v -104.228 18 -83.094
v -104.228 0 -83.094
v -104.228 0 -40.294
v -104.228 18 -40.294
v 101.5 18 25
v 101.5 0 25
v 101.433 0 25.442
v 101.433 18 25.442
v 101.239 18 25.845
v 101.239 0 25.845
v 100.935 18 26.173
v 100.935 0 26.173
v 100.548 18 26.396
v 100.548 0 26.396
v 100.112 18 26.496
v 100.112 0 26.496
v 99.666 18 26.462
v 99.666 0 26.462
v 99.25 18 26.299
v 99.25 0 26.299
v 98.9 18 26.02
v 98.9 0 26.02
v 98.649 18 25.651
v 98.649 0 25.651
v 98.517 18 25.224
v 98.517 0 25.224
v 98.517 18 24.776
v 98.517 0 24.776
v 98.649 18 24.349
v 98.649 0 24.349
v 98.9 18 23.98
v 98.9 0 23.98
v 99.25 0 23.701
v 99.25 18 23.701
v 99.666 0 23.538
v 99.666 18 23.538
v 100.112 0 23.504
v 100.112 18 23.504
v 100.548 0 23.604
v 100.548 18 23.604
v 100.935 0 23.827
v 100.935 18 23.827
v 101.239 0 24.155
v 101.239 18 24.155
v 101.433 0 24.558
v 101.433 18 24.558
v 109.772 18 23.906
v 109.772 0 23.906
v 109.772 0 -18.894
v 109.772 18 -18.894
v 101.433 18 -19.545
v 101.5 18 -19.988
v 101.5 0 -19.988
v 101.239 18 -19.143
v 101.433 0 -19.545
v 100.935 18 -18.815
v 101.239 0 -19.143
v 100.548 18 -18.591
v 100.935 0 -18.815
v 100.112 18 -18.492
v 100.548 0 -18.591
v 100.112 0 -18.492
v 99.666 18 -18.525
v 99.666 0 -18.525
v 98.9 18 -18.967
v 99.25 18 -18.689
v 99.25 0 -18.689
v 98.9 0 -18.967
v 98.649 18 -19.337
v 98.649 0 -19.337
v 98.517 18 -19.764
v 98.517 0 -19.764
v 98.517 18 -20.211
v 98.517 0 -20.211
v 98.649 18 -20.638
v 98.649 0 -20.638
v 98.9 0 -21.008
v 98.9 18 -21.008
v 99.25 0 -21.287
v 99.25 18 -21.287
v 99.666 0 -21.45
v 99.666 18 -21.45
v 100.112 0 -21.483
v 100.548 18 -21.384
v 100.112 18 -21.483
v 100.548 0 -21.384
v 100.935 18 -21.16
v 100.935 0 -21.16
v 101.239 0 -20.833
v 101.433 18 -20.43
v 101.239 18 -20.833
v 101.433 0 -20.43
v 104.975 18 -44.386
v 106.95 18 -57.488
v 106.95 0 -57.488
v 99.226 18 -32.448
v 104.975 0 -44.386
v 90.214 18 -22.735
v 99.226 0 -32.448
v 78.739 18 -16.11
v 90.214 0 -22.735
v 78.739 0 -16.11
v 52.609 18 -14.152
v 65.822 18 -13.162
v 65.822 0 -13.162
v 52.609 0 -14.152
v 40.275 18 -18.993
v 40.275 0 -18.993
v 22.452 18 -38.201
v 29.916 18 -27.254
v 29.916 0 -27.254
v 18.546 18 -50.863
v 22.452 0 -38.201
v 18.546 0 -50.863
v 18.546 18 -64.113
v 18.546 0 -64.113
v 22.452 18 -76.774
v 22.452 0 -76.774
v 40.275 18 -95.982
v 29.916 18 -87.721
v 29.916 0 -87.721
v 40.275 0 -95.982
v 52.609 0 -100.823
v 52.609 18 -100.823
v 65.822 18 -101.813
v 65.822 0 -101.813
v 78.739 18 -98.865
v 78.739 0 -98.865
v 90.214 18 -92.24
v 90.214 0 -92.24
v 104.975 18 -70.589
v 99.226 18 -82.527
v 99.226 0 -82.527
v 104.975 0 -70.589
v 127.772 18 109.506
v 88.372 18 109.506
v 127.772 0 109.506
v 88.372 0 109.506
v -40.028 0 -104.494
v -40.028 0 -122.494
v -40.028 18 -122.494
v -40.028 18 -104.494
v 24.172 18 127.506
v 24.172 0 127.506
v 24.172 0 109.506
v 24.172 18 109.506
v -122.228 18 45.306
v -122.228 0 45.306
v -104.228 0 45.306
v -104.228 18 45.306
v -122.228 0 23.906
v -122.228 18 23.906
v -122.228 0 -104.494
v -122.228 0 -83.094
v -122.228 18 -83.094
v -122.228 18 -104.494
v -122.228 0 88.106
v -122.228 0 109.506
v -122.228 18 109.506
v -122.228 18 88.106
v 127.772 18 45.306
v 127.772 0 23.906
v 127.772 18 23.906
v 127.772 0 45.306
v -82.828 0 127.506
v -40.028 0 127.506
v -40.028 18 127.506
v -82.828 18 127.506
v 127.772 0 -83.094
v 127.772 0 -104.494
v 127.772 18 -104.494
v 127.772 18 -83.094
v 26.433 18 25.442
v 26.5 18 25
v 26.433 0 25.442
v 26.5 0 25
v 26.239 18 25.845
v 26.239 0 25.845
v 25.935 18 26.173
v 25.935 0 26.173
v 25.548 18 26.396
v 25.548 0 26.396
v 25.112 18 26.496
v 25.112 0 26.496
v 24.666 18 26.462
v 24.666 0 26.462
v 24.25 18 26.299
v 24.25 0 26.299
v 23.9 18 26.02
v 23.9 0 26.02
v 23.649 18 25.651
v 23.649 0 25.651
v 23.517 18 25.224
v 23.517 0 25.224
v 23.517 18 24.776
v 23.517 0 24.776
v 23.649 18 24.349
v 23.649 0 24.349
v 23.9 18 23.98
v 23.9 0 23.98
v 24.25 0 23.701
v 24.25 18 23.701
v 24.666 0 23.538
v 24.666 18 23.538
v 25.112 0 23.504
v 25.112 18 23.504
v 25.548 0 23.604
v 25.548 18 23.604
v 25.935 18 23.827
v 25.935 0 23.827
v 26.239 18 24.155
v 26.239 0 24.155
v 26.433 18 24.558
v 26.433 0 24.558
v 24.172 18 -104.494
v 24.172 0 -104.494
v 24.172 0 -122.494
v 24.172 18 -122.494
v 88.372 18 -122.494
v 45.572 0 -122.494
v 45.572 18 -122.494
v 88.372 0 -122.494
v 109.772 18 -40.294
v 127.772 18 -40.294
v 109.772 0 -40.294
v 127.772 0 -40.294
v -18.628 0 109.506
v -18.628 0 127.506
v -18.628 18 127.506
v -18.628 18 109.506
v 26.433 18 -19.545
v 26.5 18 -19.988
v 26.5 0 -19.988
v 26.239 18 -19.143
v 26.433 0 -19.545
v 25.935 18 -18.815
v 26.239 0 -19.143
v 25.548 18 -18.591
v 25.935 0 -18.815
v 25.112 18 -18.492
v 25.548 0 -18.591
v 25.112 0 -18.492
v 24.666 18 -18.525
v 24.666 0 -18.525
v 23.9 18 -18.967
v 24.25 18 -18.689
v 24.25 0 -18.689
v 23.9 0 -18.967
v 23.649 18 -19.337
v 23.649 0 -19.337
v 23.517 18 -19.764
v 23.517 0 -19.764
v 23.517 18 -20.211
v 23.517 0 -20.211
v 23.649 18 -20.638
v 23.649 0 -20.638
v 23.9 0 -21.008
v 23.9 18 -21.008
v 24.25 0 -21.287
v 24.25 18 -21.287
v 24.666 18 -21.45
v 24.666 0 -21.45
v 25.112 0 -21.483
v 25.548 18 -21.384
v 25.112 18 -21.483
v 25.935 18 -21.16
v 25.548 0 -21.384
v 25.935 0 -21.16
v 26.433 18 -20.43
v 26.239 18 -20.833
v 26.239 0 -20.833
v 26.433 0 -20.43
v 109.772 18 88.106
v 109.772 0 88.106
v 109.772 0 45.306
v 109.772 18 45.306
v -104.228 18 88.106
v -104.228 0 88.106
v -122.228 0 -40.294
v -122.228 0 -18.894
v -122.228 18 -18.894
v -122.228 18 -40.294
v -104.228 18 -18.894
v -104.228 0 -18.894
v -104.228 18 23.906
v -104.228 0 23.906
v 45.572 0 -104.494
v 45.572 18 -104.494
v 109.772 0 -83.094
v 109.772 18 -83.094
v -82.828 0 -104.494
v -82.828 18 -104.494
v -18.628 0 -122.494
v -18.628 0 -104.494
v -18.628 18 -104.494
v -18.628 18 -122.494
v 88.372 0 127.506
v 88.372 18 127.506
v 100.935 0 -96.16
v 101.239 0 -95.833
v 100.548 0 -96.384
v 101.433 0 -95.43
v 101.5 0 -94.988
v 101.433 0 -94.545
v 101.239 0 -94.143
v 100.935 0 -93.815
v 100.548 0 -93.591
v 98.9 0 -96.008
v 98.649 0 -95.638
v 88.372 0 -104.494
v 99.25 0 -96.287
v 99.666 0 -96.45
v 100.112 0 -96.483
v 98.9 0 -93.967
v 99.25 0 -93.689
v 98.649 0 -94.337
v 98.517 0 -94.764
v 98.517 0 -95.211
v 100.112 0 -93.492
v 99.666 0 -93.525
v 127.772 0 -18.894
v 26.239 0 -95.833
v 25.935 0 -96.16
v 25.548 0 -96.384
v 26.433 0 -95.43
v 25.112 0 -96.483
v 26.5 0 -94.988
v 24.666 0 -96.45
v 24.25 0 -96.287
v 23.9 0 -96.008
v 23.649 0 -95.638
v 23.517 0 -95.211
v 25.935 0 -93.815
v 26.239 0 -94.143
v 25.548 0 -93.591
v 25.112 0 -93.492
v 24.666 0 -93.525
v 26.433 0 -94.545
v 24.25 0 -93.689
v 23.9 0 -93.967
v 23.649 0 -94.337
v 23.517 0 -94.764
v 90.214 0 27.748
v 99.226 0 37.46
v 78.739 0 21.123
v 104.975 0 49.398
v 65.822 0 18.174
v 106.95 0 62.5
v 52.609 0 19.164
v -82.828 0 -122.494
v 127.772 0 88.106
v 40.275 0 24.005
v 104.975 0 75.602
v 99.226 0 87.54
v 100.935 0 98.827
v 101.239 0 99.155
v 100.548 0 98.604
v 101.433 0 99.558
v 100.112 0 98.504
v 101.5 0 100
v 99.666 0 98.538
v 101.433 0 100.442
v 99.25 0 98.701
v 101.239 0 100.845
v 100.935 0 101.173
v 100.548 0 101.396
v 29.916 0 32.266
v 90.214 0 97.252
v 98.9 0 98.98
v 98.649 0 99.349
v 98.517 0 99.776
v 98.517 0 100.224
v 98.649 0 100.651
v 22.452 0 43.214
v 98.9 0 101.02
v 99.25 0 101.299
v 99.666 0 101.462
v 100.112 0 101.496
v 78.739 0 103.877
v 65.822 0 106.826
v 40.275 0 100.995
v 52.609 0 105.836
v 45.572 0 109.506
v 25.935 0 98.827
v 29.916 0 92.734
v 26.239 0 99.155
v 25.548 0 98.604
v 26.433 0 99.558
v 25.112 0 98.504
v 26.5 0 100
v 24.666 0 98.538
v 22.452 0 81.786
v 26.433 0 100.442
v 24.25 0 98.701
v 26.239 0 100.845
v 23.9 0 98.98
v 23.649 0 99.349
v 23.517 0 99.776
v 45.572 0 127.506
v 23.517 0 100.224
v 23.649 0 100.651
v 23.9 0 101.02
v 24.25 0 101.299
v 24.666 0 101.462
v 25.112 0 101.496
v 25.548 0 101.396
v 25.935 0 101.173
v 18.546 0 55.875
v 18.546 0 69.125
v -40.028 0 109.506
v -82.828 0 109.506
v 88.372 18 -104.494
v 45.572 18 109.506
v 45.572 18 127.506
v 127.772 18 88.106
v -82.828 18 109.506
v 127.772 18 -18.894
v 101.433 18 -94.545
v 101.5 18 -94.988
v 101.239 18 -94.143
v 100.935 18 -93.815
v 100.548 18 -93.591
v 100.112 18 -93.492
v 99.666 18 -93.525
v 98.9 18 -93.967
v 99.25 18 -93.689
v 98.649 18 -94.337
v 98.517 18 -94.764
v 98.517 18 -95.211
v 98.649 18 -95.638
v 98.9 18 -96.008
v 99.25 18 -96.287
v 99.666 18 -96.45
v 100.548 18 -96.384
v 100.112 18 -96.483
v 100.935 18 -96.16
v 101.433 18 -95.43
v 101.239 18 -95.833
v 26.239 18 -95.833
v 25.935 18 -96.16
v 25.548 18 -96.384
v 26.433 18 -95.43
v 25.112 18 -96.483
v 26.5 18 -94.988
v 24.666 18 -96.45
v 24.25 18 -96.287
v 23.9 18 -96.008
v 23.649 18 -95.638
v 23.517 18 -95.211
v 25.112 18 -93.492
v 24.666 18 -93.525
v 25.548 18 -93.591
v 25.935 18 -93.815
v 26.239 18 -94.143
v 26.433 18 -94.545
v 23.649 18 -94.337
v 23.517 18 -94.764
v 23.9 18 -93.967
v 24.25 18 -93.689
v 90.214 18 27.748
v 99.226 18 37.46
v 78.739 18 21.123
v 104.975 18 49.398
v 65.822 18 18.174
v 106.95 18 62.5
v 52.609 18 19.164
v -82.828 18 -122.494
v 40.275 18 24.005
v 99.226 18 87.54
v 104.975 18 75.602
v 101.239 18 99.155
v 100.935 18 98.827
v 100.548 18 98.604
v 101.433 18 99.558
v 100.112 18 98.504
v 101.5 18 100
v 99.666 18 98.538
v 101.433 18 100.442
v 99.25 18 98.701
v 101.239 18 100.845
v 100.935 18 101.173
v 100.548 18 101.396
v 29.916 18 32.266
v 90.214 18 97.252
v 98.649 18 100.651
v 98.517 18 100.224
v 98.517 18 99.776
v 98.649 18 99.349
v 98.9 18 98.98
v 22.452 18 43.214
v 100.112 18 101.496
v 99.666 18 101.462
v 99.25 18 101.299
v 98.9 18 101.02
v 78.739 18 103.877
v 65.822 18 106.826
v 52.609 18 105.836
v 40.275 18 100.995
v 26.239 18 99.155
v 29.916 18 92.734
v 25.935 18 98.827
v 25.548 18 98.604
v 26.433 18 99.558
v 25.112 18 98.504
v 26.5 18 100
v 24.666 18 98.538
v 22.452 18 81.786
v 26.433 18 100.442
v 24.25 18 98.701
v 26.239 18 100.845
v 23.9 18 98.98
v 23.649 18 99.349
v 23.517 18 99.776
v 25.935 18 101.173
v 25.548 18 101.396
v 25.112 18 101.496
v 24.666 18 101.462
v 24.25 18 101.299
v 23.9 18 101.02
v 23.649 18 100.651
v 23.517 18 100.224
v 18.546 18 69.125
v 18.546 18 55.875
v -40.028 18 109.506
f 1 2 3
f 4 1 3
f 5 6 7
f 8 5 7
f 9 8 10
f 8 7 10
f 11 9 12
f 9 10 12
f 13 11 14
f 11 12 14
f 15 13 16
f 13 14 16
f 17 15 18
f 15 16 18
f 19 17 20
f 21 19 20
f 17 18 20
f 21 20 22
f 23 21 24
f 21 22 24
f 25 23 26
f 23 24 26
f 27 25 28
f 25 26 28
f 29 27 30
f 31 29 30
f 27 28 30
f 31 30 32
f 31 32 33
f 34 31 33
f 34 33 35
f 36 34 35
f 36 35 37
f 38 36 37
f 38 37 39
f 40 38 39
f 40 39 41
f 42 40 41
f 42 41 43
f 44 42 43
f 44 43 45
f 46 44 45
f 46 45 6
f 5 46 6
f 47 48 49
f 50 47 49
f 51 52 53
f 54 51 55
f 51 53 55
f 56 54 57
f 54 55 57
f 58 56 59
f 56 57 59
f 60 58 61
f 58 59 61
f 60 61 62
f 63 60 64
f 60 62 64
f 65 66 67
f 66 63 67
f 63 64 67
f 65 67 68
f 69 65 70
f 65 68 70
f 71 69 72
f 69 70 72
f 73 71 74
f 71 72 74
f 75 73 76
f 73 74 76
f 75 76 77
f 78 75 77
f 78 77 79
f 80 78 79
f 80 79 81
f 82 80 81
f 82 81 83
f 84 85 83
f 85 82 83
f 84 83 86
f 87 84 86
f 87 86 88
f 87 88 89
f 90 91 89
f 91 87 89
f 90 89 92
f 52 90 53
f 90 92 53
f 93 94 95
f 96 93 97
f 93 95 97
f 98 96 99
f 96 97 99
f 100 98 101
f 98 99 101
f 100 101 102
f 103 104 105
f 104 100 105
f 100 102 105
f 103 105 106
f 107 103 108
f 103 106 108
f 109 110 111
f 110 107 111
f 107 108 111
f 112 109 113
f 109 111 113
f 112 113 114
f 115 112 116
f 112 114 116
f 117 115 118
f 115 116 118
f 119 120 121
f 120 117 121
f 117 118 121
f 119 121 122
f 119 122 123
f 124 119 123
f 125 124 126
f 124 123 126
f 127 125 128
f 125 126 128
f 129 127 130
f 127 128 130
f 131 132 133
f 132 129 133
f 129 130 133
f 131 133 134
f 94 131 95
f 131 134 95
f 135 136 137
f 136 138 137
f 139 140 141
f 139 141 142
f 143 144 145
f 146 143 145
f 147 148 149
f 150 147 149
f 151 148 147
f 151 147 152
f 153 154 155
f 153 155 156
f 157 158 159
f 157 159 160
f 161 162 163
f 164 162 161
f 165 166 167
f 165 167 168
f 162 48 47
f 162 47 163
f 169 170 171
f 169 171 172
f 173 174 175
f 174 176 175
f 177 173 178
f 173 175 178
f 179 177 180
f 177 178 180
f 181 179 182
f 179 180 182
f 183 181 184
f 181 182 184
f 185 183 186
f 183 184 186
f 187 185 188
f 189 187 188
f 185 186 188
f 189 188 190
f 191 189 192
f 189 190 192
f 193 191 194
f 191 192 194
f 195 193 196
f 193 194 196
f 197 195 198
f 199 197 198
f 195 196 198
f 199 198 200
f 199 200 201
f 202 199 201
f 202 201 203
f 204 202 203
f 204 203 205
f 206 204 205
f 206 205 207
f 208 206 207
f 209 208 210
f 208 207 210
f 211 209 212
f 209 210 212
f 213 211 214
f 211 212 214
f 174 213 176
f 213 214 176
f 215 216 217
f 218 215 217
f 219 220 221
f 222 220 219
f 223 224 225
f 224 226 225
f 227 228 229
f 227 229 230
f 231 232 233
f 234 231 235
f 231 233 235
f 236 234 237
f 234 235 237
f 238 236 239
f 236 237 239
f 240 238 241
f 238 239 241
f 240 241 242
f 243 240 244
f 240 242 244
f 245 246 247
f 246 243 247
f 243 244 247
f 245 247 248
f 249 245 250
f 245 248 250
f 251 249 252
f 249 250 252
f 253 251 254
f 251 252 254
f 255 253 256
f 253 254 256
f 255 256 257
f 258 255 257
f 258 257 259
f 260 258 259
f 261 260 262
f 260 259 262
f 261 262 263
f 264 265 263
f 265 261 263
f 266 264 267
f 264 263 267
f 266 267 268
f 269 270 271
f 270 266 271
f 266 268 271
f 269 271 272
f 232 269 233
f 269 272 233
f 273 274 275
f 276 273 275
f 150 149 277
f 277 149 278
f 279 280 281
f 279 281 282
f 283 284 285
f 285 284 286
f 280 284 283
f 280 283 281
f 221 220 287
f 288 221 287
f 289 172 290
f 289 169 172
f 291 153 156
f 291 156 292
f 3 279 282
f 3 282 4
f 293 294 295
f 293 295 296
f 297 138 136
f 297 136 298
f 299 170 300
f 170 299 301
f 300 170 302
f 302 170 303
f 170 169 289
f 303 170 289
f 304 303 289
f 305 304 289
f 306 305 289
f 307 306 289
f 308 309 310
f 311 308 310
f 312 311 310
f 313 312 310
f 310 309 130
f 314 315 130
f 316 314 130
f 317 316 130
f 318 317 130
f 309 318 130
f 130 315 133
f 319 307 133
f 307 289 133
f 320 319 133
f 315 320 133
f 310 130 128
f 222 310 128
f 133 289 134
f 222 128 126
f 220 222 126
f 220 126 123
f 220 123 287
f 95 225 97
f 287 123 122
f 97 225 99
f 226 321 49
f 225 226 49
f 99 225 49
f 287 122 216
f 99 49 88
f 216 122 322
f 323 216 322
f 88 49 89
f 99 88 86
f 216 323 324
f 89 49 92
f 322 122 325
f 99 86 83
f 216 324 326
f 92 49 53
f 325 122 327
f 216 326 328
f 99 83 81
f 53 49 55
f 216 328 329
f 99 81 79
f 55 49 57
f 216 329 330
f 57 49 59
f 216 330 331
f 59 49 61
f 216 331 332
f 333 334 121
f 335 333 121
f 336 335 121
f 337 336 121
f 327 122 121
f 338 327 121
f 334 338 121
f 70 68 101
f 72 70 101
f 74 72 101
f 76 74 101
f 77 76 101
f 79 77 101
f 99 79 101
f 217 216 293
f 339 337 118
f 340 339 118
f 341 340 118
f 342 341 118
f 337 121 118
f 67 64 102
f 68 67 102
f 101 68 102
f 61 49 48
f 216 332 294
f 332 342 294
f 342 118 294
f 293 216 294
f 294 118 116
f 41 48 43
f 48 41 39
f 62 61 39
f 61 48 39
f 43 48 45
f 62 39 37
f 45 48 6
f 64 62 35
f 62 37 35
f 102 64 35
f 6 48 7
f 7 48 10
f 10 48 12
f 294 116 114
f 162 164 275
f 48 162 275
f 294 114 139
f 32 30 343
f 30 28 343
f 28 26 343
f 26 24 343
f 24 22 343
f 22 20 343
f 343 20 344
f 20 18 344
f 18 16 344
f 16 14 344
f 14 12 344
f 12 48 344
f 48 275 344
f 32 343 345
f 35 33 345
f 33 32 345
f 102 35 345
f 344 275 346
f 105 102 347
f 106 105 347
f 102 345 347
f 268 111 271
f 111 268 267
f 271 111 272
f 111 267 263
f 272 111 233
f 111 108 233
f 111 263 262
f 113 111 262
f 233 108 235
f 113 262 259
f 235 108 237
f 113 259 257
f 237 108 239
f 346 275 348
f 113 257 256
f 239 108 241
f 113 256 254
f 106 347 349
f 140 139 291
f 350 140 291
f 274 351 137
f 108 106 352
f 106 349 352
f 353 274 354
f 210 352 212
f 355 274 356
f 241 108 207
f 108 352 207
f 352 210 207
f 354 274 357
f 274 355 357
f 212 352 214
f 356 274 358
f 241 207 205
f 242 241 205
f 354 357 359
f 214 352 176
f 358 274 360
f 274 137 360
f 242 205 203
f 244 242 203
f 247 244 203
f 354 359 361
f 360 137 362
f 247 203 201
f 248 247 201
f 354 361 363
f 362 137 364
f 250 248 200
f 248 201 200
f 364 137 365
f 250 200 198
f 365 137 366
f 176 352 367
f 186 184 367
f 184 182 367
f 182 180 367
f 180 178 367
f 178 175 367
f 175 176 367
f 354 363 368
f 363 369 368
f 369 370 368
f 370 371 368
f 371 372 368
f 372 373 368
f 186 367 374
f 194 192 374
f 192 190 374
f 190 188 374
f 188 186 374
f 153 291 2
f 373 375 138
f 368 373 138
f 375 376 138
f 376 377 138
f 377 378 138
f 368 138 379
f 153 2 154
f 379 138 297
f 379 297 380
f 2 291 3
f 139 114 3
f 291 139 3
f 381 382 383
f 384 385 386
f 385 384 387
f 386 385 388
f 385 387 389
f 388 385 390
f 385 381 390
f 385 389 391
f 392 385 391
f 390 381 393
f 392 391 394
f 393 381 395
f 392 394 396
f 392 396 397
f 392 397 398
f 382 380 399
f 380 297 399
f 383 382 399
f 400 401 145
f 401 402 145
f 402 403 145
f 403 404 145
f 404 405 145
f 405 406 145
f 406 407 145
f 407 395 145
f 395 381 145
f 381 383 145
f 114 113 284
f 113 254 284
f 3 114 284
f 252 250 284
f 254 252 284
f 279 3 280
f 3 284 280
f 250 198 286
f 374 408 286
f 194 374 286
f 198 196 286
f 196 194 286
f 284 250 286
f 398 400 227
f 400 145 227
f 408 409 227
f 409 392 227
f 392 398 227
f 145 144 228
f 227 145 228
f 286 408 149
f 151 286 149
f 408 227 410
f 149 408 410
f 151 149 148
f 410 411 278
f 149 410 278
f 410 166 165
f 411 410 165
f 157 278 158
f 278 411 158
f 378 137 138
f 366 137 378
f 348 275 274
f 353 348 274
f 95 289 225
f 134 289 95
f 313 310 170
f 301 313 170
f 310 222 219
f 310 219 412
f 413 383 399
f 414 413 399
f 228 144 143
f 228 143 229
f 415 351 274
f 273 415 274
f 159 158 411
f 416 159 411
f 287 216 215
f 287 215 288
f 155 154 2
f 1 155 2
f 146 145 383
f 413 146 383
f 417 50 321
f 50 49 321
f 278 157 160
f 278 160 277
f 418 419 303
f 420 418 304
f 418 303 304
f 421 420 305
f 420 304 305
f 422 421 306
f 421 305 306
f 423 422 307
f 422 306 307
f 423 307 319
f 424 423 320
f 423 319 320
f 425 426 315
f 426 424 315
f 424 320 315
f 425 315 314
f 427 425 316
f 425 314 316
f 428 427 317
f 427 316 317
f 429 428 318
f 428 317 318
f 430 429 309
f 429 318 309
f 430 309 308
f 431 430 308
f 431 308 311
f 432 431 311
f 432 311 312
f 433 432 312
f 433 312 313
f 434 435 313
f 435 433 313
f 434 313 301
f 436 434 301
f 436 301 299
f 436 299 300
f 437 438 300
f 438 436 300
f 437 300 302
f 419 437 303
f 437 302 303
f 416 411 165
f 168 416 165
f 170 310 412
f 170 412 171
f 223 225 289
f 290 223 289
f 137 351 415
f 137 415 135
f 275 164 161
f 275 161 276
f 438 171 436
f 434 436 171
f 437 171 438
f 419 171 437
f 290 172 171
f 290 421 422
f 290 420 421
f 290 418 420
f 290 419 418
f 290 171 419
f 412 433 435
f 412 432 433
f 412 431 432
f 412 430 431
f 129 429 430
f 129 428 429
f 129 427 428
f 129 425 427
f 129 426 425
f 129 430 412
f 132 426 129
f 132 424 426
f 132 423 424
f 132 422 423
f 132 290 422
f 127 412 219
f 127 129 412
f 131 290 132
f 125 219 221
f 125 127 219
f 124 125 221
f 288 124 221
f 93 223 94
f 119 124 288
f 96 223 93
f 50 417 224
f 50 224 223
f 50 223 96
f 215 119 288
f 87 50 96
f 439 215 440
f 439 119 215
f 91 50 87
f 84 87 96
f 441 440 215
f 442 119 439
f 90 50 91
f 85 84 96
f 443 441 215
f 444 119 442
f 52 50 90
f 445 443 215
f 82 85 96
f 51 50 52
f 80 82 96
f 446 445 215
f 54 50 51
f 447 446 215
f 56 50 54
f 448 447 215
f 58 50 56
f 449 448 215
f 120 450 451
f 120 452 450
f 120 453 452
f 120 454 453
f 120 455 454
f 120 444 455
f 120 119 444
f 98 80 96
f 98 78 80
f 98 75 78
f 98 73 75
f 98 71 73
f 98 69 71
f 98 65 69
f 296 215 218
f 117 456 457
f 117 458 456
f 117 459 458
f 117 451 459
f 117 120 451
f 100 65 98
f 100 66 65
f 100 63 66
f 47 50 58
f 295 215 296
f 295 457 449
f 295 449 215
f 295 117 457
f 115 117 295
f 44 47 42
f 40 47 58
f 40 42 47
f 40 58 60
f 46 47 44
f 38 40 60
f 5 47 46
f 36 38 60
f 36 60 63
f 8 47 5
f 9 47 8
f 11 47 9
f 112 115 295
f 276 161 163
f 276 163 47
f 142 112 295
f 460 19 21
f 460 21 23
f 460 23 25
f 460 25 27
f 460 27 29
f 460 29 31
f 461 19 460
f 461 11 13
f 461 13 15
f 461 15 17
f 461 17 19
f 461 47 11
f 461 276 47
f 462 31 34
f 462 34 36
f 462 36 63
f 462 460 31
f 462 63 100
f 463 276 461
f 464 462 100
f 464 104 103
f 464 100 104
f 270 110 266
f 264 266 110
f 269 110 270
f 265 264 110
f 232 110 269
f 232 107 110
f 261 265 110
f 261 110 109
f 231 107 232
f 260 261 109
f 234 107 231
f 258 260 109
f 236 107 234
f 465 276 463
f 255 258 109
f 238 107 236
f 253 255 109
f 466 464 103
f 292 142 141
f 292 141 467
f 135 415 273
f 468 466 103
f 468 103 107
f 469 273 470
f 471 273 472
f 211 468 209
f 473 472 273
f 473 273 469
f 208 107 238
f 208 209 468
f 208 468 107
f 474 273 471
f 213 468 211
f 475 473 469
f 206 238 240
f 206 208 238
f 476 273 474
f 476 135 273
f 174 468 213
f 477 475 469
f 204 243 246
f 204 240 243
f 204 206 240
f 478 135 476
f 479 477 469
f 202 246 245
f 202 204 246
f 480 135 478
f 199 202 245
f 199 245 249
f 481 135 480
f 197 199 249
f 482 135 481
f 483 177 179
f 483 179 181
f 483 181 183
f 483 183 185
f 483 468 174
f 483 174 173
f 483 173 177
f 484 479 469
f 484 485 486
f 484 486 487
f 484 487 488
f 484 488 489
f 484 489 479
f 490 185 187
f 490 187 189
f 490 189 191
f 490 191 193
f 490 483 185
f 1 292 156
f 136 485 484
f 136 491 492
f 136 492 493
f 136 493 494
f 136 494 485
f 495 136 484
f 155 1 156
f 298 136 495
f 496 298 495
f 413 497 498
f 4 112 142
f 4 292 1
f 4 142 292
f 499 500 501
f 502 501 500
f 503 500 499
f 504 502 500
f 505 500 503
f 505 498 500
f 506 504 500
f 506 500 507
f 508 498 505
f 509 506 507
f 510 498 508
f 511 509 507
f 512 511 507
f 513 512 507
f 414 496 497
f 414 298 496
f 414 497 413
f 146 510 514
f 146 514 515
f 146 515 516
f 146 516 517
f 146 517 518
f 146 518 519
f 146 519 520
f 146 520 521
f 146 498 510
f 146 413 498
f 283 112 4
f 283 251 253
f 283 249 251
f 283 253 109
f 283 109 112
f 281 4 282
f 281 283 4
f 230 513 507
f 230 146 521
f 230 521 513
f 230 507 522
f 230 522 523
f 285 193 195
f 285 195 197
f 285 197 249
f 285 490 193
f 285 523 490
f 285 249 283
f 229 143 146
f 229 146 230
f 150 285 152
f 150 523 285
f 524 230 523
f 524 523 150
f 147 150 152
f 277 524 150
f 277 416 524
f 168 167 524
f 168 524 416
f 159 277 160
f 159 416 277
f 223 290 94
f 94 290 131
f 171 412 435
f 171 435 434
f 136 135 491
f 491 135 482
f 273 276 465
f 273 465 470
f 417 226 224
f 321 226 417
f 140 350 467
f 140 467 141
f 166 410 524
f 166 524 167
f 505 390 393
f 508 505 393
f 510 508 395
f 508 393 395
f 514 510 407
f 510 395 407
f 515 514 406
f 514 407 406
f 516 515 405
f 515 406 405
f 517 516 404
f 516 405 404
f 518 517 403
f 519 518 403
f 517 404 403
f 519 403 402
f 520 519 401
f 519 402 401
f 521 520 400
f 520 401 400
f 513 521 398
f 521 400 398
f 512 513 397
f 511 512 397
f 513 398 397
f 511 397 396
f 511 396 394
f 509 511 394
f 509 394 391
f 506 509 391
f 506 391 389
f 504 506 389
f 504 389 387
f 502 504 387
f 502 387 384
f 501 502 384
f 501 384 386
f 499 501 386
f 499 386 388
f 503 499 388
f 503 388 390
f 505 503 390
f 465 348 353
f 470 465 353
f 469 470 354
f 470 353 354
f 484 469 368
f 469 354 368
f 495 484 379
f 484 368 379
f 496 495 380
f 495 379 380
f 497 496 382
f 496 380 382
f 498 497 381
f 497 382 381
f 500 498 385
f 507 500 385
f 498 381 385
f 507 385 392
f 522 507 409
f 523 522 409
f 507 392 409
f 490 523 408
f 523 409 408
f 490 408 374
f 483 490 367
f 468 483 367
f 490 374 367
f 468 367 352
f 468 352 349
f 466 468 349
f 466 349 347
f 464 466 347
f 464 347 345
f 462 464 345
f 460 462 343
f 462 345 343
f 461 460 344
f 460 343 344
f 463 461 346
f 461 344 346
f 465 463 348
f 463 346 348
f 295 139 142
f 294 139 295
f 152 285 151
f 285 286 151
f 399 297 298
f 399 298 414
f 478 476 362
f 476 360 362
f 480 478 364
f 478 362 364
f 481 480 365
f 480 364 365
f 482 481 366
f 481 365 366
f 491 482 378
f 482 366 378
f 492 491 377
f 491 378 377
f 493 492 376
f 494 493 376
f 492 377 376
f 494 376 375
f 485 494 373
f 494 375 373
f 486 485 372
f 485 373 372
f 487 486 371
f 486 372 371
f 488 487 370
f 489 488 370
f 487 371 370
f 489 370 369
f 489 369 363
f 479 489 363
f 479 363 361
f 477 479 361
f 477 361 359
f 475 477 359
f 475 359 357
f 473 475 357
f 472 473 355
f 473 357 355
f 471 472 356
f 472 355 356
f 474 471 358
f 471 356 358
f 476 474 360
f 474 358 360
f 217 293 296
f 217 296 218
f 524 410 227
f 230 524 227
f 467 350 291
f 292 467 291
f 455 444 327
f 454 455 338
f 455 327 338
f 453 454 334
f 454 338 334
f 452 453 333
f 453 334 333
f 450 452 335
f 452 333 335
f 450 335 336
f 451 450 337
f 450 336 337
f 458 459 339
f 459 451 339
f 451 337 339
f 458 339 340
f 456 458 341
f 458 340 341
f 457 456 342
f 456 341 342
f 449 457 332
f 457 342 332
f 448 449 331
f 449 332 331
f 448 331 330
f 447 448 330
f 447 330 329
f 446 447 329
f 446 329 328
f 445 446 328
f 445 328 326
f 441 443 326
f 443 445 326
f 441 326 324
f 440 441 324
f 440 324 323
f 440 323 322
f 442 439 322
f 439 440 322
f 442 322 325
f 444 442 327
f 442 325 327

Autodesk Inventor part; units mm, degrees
ref_plane "YZ Plane" through (0, 0, 0) normal (1, 0, 0) x (0, 1, 0)
ref_plane "XZ Plane" through (0, 0, 0) normal (0, 1, 0) x (-1, 0, 0)
ref_plane "XY Plane" through (0, 0, 0) normal (0, 0, 1) x (1, 0, 0)
sketch "Sketch1" plane through (0, 0, 0) normal (0, 1, 0) x (-1, 0, 0)
  line L0 (-127.7724, 127.5062) -> (122.2276, 127.5062)
  line L1 (122.2276, 127.5062) -> (122.2276, -122.4938)
  line L2 (122.2276, -122.4938) -> (-127.7724, -122.4938)
  line L3 (-127.7724, -122.4938) -> (-127.7724, 127.5062)
  line L4 (104.2276, -104.4938) -> (104.2276, 109.5062)
  line L5 (104.2276, -104.4938) -> (-109.7724, -104.4938)
  line L6 (-109.7724, -104.4938) -> (104.2276, -104.4938)
  line L7 (122.2276, 109.5062) -> (122.2276, 88.1062)
  line L8 (122.2276, 88.1062) -> (104.2276, 88.1062)
  line L9 (104.2276, 88.1062) -> (104.2276, 109.5062)
  line L10 (122.2276, 45.3062) -> (104.2276, 45.3062)
  line L11 (104.2276, 45.3062) -> (104.2276, 23.9062)
  line L12 (104.2276, 23.9062) -> (122.2276, 23.9062)
  line L13 (104.2276, -18.8938) -> (122.2276, -18.8938)
  line L14 (122.2276, -40.2938) -> (104.2276, -40.2938)
  line L15 (122.2276, -83.0938) -> (104.2276, -83.0938)
  line L16 (-127.7724, 127.5062) -> (-127.7724, 109.5062)
  line L17 (104.2276, 109.5062) -> (104.2276, 127.5062)
  line L18 (-127.7724, -83.0938) -> (-109.7724, -83.0938)
  line L19 (-127.7724, -40.2938) -> (-109.7724, -40.2938)
  line L20 (-109.7724, -18.8938) -> (-127.7724, -18.8938)
  line L21 (-109.7724, 23.9062) -> (-127.7724, 23.9062)
  line L22 (-127.7724, 45.3062) -> (-109.7724, 45.3062)
  line L23 (-127.7724, 88.1062) -> (-109.7724, 88.1062)
  line L24 (18.6276, -104.4938) -> (18.6276, -122.4938)
  line L25 (-24.1724, -104.4938) -> (-24.1724, -122.4938)
  line L26 (-45.5724, -122.4938) -> (-45.5724, -104.4938)
  line L27 (-88.3724, -122.4938) -> (-88.3724, -104.4938)
  line L28 (40.0276, -122.4938) -> (40.0276, -104.4938)
  line L29 (82.8276, -122.4938) -> (82.8276, -104.4938)
  line L30 (18.6276, 127.5062) -> (18.6276, 109.5062)
  line L31 (40.0276, 109.5062) -> (40.0276, 127.5062)
  line L32 (82.8276, 109.5062) -> (82.8276, 127.5062)
  line L33 (-45.5724, 109.5062) -> (-45.5724, 127.5062)
  line L34 (-88.3724, 109.5062) -> (-88.3724, 127.5062)
  line L35 (-24.1724, 127.5062) -> (-24.1724, 109.5062)
  line L36 (104.2276, 109.5062) -> (-109.7724, 109.5062)
  line L37 (-109.7724, 109.5062) -> (-109.7724, -104.4938)
  line L38 (-109.7724, 109.5062) -> (-127.7724, 109.5062)
  line L39 (-127.7724, 109.5062) -> (-127.7724, 127.5062)
  line L40 (-127.7724, 127.5062) -> (-109.7724, 127.5062)
  line L41 (-109.7724, 127.5062) -> (-109.7724, 109.5062)
  line L42 (-109.7724, -104.4938) -> (-127.7724, -104.4938)
  line L43 (-127.7724, -104.4938) -> (-127.7724, -122.4938)
  line L44 (-127.7724, -122.4938) -> (-109.7724, -122.4938)
  line L45 (-109.7724, -122.4938) -> (-109.7724, -104.4938)
  line L46 (104.2276, -104.4938) -> (122.2276, -104.4938)
  line L47 (122.2276, -104.4938) -> (122.2276, -122.4938)
  line L48 (122.2276, -122.4938) -> (104.2276, -122.4938)
  line L49 (104.2276, -122.4938) -> (104.2276, -104.4938)
  line L50 (104.2276, 109.5062) -> (122.2276, 109.5062)
  line L51 (122.2276, 109.5062) -> (122.2276, 127.5062)
  line L52 (122.2276, 127.5062) -> (104.2276, 127.5062)
  line L53 (104.2276, 127.5062) -> (104.2276, 109.5062)
  point P0 (0, 0)
  point P1 (-127.7724, -18.8938)
  point P2 (-109.7724, -104.4938)
  point P3 (-109.7724, -104.4938)
  dimension "d0" = 250
  dimension "d1" = 250
  dimension "d2" = 21.4
extrude "Plate1" add sketch "Sketch1" along normal blind 18 contours L38 L37 L23 L3 | L0 L33 L36 L34 | L36 L4 L5 L37 | L22 L37 L21 L3 | L0 L30 L36 L35 | L20 L37 L19 L3 | L0 L32 L36 L31 | L18 L37 L42 L3 | L50 L1 L8 L4 | L5 L26 L2 L27 | L10 L1 L12 L4 | L5 L24 L2 L25 | L13 L1 L14 L4 | L5 L29 L2 L28 | L15 L1 L46 L4
sketch "Sketch2" plane through (0, 0, 0) normal (0, -1, 0) x (1, 0, 0)
  line L0 (0, 0) -> (125, 0)
  line L1 (125, 0) -> (125, 125)
  line L2 (125, 125) -> (0, 125)
  line L3 (0, 125) -> (0, 0)
  line L4 (125, 125) -> (62.5, 125)
  line L5 (125, 62.5) -> (125, 125)
  circle A0 centre (62.5, 62.5) radius 44.45
  line L6 (25, 100) -> (100, 100)
  line L7 (100, 100) -> (100, 25)
  line L8 (100, 25) -> (25, 25)
  line L9 (25, 25) -> (25, 100)
  line L10 (25, 100) -> (100, 25) construction
  line L11 (100, 100) -> (25, 25) construction
  circle A1 centre (100, 100) radius 1.5
  circle A2 centre (100, 25) radius 1.5
  circle A3 centre (25, 25) radius 1.5
  circle A4 centre (25, 100) radius 1.5
  dimension "d4" = 125
  dimension "d5" = 125
  dimension "d6" = 88.9
  dimension "d7" = 75
  dimension "d8" = 75
  dimension "d9" = 3
  dimension "d10" = 3
  dimension "d11" = 3
  dimension "d12" = 3
extrude "Cut1" cut sketch "Sketch2" against normal blind 18 contours A0 L7 | L7 A0 L8 L9 L6 | L6 A0 | A1 L6 L7 | L7 L6 A1 | A0 L8 | A2 L8 L7 | L7 L8 A2 | L9 A0 | A4 L9 L6 | L6 L9 A4 | A3 L9 L8 | L8 L9 A3
ref_plane "Work Plane1" through (45.5724, 0, 2.5062) normal (0, 0, 1) x (1, 0, 0)
mirror "Mirror1" about plane through (45.5724, 0, 2.5062) normal (0, 0, 1) of "Cut1"
equation "\"d13\" = Thickness"
equation "\"d3\" = Thickness"
equation "\"BendRadius\" = Thickness"
equation "\"BendReliefWidth\" = Thickness"
equation "\"BendReliefDepth\" = 0.5 * Thickness"
equation "\"CornerReliefSize\" = 4 * Thickness"
equation "\"MinimumRemnant\" = 2 * Thickness"
equation "\"TransitionRadius\" = BendRadius"
equation "\"JacobiRadiusSize\" = BendRadius"
equation "\"GapSize\" = Thickness"
equation "\"Thickness\" = 18"
properties part number "4"
